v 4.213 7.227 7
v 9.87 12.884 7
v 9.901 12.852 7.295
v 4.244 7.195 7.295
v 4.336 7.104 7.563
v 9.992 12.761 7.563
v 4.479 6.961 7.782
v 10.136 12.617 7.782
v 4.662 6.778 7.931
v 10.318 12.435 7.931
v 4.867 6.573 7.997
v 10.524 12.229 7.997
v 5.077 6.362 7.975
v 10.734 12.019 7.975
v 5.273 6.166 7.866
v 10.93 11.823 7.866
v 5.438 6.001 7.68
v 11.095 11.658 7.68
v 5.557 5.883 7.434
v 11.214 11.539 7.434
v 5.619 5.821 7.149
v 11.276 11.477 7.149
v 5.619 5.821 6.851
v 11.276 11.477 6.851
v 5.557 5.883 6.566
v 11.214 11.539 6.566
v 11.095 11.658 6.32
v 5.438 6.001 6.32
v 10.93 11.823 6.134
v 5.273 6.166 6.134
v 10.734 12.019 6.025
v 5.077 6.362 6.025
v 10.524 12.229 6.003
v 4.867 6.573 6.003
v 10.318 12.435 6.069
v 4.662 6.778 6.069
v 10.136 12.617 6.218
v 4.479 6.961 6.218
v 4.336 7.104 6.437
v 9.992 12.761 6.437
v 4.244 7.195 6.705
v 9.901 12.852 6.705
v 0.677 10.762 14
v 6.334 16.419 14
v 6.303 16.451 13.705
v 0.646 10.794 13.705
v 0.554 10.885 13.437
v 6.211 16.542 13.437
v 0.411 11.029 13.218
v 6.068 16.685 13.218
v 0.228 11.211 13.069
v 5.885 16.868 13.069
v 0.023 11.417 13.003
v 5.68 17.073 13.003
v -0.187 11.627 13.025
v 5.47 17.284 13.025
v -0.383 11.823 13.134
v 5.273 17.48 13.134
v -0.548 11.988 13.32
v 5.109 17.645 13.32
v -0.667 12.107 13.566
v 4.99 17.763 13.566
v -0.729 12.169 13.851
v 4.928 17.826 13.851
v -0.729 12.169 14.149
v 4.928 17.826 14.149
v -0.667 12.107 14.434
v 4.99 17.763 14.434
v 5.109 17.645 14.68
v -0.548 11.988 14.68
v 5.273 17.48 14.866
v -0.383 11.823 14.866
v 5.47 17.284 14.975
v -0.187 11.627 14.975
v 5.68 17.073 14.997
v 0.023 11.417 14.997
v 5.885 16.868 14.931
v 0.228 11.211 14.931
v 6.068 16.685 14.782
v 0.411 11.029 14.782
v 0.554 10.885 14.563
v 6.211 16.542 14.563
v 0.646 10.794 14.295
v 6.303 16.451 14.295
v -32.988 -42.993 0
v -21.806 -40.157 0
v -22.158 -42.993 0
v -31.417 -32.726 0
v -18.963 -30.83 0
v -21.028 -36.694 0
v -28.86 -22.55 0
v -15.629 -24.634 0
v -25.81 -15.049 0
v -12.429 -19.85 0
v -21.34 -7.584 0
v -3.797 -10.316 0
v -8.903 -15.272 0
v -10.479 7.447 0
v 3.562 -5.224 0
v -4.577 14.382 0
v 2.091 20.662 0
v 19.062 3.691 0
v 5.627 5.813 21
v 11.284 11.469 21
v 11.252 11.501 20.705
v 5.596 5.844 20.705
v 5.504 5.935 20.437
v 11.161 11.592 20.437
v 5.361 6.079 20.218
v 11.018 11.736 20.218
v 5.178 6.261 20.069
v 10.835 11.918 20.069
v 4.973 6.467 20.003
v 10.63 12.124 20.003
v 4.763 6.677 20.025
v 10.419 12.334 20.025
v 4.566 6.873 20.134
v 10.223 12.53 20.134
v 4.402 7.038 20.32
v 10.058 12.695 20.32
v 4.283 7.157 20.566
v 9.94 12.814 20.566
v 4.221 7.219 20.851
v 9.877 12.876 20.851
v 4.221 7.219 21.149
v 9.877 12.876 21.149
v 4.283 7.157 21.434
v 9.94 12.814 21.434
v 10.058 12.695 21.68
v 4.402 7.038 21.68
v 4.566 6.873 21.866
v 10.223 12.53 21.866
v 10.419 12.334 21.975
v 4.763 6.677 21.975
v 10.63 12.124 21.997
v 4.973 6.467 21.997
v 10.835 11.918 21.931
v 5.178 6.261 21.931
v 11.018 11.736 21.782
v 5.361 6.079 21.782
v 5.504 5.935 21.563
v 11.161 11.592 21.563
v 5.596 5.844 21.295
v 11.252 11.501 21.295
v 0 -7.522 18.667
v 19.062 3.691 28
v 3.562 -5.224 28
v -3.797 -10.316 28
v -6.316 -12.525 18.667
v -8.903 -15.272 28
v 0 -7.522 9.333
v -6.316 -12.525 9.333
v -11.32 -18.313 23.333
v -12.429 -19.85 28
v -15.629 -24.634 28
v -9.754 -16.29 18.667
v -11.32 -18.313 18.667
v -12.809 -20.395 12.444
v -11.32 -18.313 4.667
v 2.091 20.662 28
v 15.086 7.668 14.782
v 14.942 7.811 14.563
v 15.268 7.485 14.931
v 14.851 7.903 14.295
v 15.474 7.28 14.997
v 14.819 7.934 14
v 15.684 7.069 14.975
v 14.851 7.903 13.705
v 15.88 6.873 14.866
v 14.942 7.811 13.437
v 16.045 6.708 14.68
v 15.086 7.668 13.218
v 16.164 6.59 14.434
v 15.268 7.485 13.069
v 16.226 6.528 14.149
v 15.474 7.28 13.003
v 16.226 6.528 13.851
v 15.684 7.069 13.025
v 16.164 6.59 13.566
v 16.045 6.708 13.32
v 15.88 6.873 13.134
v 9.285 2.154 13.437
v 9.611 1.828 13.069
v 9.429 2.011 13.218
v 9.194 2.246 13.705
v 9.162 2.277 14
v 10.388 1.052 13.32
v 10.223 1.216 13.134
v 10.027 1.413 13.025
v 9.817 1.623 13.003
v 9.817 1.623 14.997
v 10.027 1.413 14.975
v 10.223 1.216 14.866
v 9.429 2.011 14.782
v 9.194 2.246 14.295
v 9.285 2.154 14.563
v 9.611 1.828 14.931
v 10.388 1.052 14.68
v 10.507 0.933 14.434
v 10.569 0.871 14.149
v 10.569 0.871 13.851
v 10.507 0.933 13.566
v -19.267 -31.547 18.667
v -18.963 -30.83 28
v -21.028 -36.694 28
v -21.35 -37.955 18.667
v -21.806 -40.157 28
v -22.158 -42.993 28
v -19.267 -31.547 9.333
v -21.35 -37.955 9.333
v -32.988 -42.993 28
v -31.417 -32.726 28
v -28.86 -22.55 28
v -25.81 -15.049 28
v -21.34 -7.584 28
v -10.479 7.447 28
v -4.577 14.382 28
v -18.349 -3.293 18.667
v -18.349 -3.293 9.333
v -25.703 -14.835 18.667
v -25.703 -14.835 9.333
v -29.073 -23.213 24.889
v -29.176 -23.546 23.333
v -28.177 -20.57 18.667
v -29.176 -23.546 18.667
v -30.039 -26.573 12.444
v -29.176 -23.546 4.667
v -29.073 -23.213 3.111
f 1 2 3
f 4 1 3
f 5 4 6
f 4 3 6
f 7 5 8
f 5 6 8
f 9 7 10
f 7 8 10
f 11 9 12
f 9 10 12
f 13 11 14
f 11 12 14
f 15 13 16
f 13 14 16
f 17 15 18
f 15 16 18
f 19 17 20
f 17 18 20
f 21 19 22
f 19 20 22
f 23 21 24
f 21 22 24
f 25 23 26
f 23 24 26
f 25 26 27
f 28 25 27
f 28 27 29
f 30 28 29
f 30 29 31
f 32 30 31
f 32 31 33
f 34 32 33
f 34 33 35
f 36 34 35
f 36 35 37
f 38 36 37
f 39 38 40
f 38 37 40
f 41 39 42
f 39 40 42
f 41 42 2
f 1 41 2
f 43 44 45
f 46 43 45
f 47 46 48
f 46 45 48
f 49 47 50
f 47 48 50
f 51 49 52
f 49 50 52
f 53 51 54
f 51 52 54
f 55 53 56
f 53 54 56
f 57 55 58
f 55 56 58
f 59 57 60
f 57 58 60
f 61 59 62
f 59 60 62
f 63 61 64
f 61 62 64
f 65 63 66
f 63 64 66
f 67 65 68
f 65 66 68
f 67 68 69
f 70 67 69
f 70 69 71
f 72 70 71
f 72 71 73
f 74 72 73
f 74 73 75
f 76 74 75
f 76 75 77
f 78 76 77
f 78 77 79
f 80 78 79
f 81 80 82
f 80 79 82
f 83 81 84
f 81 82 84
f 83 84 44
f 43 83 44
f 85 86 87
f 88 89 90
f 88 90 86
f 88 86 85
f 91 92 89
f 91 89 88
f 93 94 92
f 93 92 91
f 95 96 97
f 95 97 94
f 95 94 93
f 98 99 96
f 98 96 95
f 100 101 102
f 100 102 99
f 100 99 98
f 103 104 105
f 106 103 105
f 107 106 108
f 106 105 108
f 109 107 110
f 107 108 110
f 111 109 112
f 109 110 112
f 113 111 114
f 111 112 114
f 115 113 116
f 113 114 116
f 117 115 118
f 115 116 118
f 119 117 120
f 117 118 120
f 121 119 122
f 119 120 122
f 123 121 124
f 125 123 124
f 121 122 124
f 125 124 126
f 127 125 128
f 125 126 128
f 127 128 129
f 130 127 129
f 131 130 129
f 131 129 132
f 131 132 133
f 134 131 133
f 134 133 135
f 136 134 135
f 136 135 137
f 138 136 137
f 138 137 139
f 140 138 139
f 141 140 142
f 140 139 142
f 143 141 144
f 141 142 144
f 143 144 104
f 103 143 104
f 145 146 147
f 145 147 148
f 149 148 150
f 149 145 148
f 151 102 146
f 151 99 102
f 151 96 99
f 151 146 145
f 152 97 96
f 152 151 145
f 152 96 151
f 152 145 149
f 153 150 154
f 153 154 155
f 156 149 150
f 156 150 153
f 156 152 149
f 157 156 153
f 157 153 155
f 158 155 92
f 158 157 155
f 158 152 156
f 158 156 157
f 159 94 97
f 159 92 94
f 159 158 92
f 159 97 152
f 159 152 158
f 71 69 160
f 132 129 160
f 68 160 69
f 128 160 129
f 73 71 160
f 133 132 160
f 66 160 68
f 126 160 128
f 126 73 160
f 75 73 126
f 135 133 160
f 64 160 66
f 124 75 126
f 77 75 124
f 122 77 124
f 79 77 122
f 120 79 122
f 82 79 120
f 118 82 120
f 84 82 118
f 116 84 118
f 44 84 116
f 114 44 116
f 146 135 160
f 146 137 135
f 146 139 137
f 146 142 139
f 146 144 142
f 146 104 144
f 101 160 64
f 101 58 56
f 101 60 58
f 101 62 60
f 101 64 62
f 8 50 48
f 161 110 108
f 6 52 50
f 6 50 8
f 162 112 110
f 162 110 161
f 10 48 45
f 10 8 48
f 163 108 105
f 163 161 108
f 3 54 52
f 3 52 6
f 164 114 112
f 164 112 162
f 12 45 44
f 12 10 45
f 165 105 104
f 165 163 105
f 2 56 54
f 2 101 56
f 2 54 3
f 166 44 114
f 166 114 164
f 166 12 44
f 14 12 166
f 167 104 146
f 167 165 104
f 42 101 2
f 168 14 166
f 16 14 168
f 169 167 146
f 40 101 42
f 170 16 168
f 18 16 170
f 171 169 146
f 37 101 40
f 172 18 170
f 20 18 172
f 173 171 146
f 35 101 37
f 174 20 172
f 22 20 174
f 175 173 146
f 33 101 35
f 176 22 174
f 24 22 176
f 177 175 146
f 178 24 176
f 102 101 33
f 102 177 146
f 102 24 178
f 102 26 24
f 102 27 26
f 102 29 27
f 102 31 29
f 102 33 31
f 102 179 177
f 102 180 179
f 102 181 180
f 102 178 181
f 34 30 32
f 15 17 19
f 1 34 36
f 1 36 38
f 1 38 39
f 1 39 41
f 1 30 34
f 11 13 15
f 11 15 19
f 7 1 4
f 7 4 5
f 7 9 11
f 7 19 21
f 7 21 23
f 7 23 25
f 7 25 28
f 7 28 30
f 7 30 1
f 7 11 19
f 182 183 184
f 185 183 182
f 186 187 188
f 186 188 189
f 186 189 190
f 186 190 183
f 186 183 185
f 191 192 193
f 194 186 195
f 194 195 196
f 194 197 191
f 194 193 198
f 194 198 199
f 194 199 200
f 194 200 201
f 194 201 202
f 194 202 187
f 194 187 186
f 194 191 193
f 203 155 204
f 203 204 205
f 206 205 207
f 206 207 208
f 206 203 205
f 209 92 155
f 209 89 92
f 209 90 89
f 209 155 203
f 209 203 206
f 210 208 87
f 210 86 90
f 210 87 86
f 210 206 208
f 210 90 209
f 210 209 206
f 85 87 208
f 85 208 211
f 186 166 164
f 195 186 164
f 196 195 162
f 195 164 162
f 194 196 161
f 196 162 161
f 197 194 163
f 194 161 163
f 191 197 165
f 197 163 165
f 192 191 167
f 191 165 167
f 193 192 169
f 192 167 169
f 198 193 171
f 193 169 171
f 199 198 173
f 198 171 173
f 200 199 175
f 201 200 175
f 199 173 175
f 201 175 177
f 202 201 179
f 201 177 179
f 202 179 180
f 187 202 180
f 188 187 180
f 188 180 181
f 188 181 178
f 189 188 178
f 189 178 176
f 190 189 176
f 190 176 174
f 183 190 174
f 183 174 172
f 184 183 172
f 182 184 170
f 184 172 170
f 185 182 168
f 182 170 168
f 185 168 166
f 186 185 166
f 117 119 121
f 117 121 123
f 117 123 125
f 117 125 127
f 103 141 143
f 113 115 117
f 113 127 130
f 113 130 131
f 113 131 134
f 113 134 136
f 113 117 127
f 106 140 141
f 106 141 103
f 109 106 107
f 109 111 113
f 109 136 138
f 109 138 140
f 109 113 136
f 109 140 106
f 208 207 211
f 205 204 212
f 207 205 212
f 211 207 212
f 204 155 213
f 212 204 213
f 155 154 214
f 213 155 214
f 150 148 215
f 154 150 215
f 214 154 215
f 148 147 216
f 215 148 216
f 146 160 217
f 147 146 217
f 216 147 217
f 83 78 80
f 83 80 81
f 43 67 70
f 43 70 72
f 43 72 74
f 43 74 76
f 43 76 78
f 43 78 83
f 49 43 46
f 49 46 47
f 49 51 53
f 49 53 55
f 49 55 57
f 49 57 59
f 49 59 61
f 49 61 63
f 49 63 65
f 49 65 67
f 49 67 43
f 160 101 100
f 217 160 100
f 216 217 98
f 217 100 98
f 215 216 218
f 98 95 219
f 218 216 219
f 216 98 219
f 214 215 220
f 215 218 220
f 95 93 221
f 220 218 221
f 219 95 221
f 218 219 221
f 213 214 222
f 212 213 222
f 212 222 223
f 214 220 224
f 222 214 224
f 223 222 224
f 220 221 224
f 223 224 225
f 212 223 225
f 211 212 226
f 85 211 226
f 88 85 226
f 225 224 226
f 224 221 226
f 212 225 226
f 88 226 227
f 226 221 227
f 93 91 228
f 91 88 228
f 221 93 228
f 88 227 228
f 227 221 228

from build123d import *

# Parameters (mm, degrees)
BOSS_EXTRUDE1_DEPTH = 28
SKETCH2_R           = 1
CUT_EXTRUDE1_DEPTH  = 8


with BuildPart() as part:
    # Sketch1 → Boss-Extrude1 (new body)
    with BuildSketch(Plane.XY):
        with BuildLine():
            Line((2.091427576, 20.661862086), (19.061990324, 3.691299338))
            add(Edge.make_bspline(
                [(19.061990324, 3.691299338), (12.746216472, -0.109381504), (3.690052204, -4.556022811), (-8.472746201, -13.766338541), (-12.879485208, -20.395145485), (-15.628608368, -24.633897386)],
                knots=[0, 0, 0, 0, 0.486352052, 0.663536936, 1, 1, 1, 1], degree=3))
            add(Edge.make_bspline(
                [(-15.628608368, -24.633897386), (-20.139825212, -31.511110603), (-21.892637983, -38.928427503), (-22.158270614, -42.992769069)],
                knots=[0, 0, 0, 0, 1, 1, 1, 1], degree=3))
            Line((-22.158270614, -42.992769069), (-32.987873718, -42.992769069))
            add(Edge.make_bspline(
                [(2.091427576, 20.661862086), (-6.15306444, 13.902564566), (-14.885859474, 1.614168074), (-29.29473419, -18.775684606), (-31.797796149, -33.536211334), (-32.987873718, -42.992769069)],
                knots=[0, 0, 0, 0, 0.424008196, 0.607838578, 1, 1, 1, 1], degree=3))
        make_face()
    extrude(amount=BOSS_EXTRUDE1_DEPTH)

    # Sketch2 → Cut-Extrude1 (cut)
    with BuildSketch(Plane(origin=(11.376644831, 11.376644831, 0), x_dir=(0, 0, -1), z_dir=(0.7071067811865388, 0.7071067811865562, 0))):
        with Locations(Location((-7, 1.131280172, 0), (0, 0, 90))):
            Circle(SKETCH2_R)
        with Locations(Location((-14, 8.131280172, 0), (0, 0, 270))):
            Circle(SKETCH2_R)
        with Locations(Location((-14, -5.868719828, 0), (0, 0, 90))):
            Circle(SKETCH2_R)
        with Locations(Location((-21, 1.131280172, 0), (0, 0, 270))):
            Circle(SKETCH2_R)
    extrude(amount=-CUT_EXTRUDE1_DEPTH, mode=Mode.SUBTRACT)


solid = part.part
